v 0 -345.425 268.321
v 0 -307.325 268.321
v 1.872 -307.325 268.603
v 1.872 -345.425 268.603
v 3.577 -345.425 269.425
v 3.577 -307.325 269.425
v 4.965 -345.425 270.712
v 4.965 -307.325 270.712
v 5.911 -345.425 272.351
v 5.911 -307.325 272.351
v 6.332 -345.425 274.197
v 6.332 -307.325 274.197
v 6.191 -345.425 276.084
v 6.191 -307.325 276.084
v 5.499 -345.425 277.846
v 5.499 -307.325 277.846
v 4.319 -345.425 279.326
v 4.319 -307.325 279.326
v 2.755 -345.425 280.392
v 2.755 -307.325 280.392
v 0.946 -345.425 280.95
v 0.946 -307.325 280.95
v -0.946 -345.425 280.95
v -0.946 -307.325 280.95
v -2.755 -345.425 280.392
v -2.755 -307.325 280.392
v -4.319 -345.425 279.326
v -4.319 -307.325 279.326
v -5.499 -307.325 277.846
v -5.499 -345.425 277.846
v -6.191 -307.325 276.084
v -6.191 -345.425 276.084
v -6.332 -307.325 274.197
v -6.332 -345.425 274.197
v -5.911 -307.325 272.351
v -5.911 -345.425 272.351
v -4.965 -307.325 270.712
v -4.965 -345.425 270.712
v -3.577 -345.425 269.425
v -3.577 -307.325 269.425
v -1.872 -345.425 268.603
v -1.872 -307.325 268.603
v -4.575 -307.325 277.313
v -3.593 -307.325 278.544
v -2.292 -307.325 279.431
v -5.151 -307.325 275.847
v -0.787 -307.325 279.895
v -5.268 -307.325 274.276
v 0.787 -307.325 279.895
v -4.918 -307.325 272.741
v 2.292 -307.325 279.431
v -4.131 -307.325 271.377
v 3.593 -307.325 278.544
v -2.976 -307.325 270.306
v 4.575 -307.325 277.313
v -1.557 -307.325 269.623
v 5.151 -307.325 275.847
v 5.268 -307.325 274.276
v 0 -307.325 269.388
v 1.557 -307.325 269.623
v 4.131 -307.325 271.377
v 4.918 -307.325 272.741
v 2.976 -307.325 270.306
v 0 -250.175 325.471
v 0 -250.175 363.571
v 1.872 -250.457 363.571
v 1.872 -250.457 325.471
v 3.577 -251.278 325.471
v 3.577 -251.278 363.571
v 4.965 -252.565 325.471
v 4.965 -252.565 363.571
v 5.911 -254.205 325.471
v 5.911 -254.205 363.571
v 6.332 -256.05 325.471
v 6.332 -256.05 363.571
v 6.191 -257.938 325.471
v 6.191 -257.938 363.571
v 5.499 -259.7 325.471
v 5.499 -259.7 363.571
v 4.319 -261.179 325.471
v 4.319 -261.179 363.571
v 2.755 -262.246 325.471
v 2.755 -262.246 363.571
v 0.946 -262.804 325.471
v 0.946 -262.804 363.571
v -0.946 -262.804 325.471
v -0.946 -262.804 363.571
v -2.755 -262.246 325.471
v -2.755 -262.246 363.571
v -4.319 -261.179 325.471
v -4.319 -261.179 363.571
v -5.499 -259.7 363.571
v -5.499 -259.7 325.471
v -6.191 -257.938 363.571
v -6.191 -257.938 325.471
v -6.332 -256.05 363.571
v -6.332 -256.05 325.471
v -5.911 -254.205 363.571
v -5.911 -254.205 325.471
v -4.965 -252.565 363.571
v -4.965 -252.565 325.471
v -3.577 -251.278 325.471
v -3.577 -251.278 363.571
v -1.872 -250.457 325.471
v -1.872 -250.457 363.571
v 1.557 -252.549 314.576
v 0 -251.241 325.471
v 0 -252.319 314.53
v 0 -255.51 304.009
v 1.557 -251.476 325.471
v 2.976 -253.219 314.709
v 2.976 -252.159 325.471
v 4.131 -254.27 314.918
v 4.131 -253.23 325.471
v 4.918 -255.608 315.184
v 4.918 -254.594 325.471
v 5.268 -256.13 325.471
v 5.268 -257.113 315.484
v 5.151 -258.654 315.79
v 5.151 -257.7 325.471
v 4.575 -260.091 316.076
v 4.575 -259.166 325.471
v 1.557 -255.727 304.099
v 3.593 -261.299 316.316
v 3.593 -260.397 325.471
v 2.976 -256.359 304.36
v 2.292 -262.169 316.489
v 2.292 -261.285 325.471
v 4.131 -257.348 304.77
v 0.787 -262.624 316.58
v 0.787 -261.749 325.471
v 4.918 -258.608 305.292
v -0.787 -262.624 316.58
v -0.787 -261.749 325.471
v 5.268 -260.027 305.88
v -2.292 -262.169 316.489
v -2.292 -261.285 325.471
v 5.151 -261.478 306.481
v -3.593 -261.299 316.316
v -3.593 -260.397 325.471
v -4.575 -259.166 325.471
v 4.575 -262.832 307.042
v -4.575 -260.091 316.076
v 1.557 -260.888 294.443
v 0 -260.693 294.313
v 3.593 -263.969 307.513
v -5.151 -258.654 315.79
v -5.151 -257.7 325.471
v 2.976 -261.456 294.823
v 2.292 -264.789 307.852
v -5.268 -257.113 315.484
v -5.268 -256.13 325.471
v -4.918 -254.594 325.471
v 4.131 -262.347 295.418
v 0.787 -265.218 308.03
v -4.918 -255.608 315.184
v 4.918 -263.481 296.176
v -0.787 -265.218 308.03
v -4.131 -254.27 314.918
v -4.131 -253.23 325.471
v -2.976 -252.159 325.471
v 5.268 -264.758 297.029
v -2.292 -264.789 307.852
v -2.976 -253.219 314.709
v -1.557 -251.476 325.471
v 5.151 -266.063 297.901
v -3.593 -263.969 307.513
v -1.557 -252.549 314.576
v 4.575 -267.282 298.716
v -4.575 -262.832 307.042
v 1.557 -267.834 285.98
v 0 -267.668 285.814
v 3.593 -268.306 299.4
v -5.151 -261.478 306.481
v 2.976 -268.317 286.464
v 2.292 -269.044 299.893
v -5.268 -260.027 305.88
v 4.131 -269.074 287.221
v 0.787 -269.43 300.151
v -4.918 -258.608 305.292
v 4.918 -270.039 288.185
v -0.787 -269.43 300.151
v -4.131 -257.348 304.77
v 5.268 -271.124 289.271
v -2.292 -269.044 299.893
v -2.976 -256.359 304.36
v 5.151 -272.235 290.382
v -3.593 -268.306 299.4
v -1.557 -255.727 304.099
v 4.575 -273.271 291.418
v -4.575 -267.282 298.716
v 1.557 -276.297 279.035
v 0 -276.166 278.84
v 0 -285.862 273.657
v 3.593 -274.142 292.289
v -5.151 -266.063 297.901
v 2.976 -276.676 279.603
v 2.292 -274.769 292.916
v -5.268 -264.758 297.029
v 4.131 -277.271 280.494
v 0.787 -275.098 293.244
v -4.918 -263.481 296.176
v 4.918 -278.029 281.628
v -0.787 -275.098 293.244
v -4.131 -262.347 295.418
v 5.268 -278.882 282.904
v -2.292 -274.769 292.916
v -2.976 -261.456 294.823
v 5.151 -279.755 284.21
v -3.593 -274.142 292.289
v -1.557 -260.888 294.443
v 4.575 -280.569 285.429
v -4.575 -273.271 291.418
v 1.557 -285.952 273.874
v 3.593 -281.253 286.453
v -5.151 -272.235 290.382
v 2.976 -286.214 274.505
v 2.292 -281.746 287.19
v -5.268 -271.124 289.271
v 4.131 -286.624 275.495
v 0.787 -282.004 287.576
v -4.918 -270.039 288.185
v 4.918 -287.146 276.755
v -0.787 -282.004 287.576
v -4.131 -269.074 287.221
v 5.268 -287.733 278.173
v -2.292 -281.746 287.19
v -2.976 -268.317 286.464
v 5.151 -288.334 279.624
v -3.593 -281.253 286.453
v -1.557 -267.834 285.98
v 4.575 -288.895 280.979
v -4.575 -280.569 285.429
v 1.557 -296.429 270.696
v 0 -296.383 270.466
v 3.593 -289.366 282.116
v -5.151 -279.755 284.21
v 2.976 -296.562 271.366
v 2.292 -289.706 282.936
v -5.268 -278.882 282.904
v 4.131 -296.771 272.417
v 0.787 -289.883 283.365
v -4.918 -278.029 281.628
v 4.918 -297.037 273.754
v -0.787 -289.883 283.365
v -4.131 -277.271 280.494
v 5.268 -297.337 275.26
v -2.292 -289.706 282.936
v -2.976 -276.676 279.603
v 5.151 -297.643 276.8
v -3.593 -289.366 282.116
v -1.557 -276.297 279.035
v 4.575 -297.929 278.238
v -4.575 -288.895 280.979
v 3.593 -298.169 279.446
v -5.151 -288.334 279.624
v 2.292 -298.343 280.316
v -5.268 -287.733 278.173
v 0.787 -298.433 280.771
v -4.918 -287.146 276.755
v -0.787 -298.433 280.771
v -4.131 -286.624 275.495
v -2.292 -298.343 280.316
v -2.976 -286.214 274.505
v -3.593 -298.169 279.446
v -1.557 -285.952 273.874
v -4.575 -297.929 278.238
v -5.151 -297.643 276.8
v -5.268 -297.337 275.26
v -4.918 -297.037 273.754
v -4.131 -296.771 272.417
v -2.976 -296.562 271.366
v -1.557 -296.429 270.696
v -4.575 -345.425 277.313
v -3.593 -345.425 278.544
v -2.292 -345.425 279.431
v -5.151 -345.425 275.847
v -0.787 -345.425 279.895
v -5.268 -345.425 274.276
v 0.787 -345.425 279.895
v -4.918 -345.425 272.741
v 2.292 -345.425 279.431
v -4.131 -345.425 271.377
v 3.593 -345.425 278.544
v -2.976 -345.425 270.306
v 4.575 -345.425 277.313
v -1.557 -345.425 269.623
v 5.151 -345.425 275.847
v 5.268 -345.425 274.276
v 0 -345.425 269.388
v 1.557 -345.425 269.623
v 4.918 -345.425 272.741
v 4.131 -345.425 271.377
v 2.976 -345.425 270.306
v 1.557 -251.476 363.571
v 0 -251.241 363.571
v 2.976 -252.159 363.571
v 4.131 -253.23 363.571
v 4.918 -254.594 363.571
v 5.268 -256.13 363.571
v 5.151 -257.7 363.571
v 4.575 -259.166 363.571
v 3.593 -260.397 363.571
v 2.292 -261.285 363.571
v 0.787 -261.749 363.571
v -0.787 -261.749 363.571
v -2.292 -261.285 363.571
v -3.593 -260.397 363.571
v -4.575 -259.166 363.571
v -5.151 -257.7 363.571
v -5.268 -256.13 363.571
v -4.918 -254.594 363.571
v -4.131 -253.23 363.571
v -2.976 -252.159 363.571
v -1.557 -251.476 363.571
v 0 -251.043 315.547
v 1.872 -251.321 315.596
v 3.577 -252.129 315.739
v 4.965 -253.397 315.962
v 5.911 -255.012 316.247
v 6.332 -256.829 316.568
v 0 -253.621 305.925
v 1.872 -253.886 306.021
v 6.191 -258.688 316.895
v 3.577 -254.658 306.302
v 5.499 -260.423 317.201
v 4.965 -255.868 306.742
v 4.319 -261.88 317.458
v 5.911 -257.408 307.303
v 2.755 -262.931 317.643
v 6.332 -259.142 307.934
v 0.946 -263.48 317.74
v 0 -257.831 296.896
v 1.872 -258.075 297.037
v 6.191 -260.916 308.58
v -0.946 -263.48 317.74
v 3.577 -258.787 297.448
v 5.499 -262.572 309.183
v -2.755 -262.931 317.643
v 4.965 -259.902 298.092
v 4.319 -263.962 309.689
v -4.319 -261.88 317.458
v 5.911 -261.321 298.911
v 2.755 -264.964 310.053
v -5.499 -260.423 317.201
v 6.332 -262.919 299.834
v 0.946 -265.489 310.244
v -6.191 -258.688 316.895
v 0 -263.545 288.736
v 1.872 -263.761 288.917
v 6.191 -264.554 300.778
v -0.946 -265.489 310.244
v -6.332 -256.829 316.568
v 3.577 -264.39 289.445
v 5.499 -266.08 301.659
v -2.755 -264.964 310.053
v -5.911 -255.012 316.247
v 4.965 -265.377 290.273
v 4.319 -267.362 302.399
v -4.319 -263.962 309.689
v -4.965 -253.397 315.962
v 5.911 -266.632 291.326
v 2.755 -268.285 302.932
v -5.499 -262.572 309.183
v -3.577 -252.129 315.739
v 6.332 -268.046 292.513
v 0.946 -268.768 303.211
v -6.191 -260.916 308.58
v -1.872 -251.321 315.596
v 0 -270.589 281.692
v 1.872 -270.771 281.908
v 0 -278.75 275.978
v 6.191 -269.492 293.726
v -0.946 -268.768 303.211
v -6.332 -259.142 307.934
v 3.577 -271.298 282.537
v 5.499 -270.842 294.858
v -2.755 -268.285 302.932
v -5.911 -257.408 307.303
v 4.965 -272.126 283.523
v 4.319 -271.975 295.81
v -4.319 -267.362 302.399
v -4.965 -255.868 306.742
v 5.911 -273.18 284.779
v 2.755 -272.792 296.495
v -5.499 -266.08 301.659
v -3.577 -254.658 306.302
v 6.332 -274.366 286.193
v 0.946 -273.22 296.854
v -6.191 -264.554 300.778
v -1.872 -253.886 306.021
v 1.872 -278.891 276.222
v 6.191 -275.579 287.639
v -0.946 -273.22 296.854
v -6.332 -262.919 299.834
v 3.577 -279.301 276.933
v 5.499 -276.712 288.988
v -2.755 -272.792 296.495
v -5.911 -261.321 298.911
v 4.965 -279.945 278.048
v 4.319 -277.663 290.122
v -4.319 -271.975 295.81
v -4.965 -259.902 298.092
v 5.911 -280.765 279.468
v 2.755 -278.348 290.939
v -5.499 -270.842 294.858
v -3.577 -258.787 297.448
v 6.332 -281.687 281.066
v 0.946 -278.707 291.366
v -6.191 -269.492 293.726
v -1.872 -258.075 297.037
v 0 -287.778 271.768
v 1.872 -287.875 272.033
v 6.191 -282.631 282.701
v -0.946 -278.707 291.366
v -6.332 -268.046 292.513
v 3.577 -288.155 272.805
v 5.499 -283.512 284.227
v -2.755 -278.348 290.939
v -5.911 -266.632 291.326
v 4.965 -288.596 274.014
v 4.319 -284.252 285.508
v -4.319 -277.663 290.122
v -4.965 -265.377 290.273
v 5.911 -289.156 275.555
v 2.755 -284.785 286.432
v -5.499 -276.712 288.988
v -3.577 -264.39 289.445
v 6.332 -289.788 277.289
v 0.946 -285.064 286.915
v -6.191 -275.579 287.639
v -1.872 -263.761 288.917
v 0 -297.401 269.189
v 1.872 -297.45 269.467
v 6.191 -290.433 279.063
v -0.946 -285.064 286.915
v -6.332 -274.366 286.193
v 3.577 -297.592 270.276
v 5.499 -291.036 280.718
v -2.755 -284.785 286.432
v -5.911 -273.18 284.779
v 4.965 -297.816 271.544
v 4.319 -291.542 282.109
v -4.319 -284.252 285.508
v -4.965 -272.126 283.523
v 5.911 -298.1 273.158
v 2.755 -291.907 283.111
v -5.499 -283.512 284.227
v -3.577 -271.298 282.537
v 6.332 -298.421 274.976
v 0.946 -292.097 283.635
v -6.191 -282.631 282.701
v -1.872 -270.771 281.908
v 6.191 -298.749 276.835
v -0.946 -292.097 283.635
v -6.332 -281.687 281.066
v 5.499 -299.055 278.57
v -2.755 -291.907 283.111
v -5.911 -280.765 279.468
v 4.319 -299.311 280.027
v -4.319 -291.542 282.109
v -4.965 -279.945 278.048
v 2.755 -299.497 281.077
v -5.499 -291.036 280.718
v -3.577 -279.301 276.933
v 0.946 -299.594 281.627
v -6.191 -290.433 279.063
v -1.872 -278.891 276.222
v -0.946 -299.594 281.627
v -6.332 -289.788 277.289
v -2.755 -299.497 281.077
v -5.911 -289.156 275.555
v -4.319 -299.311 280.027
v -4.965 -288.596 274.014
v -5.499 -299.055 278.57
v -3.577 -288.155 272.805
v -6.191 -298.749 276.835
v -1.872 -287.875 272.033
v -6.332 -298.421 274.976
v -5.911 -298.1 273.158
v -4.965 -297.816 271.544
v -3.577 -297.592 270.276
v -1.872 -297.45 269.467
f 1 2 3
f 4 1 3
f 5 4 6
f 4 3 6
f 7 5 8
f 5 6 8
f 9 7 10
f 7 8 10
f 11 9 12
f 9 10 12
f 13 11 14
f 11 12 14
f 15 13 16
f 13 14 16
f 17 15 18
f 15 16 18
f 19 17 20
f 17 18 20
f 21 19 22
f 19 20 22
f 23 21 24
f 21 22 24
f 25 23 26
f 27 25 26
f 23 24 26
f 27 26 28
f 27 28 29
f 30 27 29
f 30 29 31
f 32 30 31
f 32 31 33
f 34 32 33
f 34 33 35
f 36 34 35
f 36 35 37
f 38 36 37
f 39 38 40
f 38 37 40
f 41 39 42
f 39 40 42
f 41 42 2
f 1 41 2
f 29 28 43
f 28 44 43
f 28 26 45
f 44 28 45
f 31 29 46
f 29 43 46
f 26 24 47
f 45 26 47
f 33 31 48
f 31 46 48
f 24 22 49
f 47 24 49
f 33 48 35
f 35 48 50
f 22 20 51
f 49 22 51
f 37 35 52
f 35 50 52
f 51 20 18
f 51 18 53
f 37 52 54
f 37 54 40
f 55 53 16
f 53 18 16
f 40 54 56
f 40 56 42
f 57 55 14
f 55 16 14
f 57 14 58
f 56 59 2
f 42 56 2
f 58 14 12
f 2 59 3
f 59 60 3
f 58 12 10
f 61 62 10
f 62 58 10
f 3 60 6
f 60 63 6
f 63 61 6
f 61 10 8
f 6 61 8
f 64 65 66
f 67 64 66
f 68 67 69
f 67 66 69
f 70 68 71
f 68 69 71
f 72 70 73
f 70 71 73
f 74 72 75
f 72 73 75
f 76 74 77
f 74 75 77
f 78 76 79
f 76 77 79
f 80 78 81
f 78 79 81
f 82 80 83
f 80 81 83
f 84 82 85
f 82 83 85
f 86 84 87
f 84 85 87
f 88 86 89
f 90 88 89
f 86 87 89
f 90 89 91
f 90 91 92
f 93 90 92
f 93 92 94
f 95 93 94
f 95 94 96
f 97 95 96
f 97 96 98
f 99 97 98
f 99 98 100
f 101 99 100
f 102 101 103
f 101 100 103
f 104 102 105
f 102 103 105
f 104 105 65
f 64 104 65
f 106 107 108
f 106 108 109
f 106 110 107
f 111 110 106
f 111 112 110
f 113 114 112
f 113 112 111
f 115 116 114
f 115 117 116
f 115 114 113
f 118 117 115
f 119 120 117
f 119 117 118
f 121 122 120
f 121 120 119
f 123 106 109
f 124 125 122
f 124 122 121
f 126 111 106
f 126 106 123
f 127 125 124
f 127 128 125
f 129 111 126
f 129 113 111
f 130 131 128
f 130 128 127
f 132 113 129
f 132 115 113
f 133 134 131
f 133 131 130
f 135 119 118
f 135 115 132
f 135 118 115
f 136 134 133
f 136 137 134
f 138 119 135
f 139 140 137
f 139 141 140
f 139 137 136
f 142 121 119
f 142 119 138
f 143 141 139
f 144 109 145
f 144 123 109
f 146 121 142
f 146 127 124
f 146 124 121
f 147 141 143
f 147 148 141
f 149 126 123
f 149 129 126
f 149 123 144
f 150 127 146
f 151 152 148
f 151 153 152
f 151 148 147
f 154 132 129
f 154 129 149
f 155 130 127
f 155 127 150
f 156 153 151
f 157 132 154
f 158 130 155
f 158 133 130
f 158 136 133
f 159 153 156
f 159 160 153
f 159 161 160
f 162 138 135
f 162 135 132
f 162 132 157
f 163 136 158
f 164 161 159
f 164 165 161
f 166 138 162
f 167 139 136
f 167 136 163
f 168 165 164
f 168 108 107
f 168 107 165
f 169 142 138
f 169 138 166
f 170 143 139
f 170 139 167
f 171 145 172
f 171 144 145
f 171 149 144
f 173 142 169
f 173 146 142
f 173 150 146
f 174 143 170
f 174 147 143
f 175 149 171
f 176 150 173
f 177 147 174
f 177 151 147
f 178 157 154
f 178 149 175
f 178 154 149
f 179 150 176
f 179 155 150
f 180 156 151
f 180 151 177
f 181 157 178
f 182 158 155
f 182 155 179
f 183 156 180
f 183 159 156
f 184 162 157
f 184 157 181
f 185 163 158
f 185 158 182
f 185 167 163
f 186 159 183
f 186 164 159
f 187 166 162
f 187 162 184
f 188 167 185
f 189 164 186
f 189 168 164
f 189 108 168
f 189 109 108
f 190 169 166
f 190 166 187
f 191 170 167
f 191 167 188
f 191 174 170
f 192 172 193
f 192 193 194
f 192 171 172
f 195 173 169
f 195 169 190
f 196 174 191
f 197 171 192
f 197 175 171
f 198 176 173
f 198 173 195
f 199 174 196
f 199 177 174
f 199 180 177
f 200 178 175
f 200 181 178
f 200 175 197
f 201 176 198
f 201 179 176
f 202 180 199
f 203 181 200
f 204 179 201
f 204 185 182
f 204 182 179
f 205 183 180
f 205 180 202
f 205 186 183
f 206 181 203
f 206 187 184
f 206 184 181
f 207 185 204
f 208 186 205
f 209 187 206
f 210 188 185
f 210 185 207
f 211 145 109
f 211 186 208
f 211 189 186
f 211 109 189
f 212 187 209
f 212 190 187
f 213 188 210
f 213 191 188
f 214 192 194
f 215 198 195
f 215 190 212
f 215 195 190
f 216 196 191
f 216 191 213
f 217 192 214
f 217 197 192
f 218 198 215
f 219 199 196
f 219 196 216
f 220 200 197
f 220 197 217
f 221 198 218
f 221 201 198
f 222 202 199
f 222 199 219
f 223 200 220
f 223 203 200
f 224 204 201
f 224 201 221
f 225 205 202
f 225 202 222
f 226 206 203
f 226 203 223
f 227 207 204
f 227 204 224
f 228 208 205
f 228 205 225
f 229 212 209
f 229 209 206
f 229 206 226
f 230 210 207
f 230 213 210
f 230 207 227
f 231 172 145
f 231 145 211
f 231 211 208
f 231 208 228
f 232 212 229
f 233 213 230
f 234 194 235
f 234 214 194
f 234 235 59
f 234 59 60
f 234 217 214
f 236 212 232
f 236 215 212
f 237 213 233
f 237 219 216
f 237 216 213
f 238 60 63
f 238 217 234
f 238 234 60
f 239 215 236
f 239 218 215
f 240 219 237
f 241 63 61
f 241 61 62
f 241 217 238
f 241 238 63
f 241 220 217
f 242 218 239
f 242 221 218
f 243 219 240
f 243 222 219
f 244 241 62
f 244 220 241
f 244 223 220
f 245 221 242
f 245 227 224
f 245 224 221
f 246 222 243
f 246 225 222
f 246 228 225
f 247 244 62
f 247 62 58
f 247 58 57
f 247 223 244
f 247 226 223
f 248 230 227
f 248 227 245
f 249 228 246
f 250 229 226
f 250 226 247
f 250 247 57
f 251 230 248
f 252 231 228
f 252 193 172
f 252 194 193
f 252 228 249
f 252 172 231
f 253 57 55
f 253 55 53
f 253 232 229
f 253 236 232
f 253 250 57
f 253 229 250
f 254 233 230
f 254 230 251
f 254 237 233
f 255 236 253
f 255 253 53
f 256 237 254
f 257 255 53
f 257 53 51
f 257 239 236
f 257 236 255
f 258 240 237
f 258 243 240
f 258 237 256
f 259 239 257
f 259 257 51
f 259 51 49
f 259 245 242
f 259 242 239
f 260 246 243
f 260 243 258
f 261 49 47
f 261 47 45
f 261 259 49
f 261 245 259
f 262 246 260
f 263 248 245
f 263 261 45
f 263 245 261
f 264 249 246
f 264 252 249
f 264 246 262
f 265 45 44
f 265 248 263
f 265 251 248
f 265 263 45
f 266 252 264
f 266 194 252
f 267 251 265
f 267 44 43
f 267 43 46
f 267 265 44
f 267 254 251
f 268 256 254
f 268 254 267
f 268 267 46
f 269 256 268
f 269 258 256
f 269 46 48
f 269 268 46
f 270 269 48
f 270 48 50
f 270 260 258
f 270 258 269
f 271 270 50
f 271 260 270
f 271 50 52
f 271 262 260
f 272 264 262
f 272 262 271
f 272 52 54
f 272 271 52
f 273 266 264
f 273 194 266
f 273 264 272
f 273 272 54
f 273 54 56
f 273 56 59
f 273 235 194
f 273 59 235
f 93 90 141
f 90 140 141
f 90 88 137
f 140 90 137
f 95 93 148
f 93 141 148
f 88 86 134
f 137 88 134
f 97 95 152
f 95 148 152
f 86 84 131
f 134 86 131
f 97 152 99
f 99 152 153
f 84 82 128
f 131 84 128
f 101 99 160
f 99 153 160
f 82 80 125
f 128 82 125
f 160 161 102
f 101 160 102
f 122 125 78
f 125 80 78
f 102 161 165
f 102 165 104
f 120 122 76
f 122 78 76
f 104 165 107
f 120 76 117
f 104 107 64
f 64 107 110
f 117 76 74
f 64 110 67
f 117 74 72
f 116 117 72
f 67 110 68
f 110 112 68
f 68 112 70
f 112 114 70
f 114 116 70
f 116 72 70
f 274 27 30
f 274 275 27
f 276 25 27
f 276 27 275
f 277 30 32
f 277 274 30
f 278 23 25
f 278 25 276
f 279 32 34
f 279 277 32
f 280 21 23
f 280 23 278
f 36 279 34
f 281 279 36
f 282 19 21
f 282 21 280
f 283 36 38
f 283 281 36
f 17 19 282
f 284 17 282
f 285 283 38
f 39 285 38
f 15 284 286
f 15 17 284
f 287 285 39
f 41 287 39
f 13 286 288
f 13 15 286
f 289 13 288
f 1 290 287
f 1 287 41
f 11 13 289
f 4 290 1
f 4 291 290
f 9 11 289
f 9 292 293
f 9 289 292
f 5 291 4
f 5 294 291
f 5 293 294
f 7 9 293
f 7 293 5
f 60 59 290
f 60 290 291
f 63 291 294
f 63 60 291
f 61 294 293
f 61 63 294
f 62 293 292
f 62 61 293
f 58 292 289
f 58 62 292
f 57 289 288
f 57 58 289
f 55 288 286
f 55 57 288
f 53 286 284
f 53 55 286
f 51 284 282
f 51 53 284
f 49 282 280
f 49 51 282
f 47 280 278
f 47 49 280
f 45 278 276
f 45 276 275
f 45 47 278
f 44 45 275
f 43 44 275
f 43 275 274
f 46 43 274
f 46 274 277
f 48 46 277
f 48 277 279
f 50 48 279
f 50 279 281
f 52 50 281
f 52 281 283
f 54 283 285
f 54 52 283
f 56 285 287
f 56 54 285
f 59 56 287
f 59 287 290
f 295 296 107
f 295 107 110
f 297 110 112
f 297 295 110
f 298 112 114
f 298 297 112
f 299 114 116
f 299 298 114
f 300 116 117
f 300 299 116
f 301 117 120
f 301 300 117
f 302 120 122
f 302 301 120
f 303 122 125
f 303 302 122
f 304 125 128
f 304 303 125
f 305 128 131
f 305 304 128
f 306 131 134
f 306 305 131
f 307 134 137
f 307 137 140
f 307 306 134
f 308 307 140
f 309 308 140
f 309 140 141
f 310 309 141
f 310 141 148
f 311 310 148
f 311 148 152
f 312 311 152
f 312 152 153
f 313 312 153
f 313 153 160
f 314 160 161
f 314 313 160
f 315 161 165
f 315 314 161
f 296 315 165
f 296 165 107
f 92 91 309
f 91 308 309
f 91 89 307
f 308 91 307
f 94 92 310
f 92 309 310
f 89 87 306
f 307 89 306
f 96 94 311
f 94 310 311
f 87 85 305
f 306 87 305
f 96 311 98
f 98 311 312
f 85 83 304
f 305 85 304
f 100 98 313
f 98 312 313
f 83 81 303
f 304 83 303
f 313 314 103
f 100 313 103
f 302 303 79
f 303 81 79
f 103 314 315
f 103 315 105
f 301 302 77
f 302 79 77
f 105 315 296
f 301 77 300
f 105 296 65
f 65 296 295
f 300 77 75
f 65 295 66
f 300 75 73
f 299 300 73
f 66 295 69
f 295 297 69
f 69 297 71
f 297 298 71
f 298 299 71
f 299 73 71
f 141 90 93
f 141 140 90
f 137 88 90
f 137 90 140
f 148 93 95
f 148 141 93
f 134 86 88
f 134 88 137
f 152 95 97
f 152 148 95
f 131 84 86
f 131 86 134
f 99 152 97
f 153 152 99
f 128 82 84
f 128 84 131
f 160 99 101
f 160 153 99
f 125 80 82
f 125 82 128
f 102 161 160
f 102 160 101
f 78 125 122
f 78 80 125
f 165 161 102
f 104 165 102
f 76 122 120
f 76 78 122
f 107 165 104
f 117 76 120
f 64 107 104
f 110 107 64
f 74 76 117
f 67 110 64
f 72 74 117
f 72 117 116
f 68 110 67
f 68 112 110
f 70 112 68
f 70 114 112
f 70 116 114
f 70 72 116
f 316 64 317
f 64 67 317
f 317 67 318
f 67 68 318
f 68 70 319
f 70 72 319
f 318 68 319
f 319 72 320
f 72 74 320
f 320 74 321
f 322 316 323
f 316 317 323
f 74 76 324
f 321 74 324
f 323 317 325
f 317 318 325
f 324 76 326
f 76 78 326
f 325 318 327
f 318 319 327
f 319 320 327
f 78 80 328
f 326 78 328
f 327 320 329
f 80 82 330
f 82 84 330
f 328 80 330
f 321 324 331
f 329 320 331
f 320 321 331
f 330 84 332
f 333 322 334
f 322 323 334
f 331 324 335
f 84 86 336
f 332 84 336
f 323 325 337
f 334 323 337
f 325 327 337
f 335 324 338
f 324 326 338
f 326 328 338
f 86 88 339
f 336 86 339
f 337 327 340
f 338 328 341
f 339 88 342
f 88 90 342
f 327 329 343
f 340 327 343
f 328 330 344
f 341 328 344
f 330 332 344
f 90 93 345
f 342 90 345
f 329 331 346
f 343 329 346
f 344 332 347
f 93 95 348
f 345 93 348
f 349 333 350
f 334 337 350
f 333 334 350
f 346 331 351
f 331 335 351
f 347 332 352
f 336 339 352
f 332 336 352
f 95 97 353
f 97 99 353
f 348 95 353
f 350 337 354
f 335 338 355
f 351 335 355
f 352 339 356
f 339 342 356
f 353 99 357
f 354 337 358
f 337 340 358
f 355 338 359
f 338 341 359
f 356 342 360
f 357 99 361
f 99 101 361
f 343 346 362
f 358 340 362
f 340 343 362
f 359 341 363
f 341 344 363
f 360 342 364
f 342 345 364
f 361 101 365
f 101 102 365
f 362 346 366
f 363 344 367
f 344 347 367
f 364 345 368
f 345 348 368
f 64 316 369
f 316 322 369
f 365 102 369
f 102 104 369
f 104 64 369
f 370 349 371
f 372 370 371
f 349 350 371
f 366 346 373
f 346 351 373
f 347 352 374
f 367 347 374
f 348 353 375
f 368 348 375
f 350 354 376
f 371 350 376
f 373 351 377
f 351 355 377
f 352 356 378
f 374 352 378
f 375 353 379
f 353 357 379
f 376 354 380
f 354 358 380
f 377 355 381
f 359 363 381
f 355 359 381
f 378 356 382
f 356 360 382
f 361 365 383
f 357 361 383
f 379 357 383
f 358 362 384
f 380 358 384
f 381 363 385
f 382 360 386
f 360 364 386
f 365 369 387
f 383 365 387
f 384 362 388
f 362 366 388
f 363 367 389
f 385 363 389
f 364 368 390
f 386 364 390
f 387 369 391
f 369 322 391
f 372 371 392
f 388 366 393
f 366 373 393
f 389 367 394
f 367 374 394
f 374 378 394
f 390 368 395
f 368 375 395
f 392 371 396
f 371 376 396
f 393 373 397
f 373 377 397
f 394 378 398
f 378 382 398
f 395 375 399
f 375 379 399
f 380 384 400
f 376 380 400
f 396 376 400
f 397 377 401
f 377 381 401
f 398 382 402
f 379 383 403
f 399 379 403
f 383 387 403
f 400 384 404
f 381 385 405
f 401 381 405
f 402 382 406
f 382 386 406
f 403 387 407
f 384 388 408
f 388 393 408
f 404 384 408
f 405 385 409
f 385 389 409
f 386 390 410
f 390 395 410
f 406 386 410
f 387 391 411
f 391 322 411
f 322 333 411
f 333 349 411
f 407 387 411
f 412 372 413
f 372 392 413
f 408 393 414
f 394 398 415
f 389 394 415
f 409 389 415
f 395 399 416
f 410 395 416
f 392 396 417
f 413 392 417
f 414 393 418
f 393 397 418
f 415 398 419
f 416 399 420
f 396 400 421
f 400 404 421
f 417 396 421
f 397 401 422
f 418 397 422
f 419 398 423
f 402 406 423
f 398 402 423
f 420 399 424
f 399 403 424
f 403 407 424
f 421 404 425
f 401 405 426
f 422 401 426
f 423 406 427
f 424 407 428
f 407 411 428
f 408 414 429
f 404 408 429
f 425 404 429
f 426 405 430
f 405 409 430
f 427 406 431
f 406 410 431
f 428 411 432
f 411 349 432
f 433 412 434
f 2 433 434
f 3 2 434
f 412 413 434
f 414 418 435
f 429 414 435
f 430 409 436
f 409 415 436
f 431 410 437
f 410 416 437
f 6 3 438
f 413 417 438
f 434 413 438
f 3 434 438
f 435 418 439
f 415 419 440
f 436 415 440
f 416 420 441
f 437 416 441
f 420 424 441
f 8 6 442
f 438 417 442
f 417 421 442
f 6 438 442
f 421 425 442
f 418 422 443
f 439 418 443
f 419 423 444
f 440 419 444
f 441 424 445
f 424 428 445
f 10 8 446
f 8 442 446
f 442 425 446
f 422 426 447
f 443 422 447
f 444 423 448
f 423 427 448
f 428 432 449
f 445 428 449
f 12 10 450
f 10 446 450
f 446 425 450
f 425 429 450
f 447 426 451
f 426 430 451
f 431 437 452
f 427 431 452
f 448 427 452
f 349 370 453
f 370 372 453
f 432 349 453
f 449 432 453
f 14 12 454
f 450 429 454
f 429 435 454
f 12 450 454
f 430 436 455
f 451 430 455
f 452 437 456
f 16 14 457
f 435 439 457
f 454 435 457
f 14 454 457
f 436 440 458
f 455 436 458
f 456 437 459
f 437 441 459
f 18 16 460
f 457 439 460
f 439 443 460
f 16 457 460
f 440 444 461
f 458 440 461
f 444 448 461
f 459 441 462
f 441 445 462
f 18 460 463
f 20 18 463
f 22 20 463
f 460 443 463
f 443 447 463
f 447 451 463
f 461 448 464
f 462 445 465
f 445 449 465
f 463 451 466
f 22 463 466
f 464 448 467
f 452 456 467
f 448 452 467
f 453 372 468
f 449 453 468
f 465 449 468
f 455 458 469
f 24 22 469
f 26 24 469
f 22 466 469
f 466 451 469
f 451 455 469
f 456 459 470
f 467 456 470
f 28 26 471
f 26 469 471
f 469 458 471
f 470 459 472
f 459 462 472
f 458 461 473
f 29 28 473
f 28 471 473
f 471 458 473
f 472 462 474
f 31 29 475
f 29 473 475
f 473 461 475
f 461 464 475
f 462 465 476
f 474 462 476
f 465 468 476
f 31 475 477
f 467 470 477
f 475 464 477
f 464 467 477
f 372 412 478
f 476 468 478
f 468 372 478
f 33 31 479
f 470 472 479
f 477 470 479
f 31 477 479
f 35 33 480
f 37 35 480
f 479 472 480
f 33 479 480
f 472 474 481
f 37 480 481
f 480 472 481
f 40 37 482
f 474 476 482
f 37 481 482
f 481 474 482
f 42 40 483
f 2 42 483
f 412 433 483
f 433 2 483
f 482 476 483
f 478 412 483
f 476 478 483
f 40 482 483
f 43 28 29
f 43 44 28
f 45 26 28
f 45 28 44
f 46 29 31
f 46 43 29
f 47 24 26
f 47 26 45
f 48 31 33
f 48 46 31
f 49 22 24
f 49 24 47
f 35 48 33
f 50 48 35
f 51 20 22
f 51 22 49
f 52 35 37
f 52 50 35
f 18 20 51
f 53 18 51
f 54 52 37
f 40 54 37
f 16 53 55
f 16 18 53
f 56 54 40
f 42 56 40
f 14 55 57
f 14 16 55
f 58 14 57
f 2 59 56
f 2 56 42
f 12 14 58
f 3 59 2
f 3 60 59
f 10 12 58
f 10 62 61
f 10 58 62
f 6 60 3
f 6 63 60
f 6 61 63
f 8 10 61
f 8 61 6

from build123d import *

# Parameters (mm, degrees)
SKETCH11_ON_SEGMENT_1_R   = 6.35
SKETCH11_ON_SEGMENT_1_R_2 = 5.2832
PIPE_0_5_SCH_40_1_DEPTH   = 38.1
SKETCH11_ON_SEGMENT_2_R   = 6.35
SKETCH11_ON_SEGMENT_2_R_2 = 5.2832
PIPE_0_5_SCH_40_1_2_ANGLE = 90
SKETCH11_R                = 6.35
SKETCH11_R_2              = 5.2832
PIPE_0_5_SCH_40_1_3_DEPTH = 38.1


with BuildPart() as part:
    # Sketch11 on segment 1 (carried to segment 1) → Pipe 0.5 SCH 40(1) (new body)
    with BuildSketch(Plane(origin=(0, -256.524515023, 363.571235239), x_dir=(0, 1, 0), z_dir=(0, 0, -1))):
        Circle(SKETCH11_ON_SEGMENT_1_R)
        Circle(SKETCH11_ON_SEGMENT_1_R_2, mode=Mode.SUBTRACT)
    extrude(amount=PIPE_0_5_SCH_40_1_DEPTH)


with BuildPart() as body_2:
    # Sketch11 on segment 2 (carried to the start of arc 2) → Pipe 0.5 SCH 40_1 2 (revolve)
    with BuildSketch(Plane(origin=(0, -256.524515023, 325.471235239), x_dir=(0, 1, 0), z_dir=(0, 0, -1))):
        Circle(SKETCH11_ON_SEGMENT_2_R)
        Circle(SKETCH11_ON_SEGMENT_2_R_2, mode=Mode.SUBTRACT)
    revolve(axis=Axis((0, -307.324515023, 325.471235239), (-1, 0, 0)), revolution_arc=PIPE_0_5_SCH_40_1_2_ANGLE)


with BuildPart() as body_3:
    # Sketch11 → Pipe 0.5 SCH 40_1 3 (new body)
    with BuildSketch(Plane(origin=(0, -307.324515023, 274.671235239), x_dir=(0, 0, -1), z_dir=(0, -1, 0))):
        Circle(SKETCH11_R)
        Circle(SKETCH11_R_2, mode=Mode.SUBTRACT)
    extrude(amount=PIPE_0_5_SCH_40_1_3_DEPTH)


solid = Compound([part.part, body_2.part, body_3.part])
